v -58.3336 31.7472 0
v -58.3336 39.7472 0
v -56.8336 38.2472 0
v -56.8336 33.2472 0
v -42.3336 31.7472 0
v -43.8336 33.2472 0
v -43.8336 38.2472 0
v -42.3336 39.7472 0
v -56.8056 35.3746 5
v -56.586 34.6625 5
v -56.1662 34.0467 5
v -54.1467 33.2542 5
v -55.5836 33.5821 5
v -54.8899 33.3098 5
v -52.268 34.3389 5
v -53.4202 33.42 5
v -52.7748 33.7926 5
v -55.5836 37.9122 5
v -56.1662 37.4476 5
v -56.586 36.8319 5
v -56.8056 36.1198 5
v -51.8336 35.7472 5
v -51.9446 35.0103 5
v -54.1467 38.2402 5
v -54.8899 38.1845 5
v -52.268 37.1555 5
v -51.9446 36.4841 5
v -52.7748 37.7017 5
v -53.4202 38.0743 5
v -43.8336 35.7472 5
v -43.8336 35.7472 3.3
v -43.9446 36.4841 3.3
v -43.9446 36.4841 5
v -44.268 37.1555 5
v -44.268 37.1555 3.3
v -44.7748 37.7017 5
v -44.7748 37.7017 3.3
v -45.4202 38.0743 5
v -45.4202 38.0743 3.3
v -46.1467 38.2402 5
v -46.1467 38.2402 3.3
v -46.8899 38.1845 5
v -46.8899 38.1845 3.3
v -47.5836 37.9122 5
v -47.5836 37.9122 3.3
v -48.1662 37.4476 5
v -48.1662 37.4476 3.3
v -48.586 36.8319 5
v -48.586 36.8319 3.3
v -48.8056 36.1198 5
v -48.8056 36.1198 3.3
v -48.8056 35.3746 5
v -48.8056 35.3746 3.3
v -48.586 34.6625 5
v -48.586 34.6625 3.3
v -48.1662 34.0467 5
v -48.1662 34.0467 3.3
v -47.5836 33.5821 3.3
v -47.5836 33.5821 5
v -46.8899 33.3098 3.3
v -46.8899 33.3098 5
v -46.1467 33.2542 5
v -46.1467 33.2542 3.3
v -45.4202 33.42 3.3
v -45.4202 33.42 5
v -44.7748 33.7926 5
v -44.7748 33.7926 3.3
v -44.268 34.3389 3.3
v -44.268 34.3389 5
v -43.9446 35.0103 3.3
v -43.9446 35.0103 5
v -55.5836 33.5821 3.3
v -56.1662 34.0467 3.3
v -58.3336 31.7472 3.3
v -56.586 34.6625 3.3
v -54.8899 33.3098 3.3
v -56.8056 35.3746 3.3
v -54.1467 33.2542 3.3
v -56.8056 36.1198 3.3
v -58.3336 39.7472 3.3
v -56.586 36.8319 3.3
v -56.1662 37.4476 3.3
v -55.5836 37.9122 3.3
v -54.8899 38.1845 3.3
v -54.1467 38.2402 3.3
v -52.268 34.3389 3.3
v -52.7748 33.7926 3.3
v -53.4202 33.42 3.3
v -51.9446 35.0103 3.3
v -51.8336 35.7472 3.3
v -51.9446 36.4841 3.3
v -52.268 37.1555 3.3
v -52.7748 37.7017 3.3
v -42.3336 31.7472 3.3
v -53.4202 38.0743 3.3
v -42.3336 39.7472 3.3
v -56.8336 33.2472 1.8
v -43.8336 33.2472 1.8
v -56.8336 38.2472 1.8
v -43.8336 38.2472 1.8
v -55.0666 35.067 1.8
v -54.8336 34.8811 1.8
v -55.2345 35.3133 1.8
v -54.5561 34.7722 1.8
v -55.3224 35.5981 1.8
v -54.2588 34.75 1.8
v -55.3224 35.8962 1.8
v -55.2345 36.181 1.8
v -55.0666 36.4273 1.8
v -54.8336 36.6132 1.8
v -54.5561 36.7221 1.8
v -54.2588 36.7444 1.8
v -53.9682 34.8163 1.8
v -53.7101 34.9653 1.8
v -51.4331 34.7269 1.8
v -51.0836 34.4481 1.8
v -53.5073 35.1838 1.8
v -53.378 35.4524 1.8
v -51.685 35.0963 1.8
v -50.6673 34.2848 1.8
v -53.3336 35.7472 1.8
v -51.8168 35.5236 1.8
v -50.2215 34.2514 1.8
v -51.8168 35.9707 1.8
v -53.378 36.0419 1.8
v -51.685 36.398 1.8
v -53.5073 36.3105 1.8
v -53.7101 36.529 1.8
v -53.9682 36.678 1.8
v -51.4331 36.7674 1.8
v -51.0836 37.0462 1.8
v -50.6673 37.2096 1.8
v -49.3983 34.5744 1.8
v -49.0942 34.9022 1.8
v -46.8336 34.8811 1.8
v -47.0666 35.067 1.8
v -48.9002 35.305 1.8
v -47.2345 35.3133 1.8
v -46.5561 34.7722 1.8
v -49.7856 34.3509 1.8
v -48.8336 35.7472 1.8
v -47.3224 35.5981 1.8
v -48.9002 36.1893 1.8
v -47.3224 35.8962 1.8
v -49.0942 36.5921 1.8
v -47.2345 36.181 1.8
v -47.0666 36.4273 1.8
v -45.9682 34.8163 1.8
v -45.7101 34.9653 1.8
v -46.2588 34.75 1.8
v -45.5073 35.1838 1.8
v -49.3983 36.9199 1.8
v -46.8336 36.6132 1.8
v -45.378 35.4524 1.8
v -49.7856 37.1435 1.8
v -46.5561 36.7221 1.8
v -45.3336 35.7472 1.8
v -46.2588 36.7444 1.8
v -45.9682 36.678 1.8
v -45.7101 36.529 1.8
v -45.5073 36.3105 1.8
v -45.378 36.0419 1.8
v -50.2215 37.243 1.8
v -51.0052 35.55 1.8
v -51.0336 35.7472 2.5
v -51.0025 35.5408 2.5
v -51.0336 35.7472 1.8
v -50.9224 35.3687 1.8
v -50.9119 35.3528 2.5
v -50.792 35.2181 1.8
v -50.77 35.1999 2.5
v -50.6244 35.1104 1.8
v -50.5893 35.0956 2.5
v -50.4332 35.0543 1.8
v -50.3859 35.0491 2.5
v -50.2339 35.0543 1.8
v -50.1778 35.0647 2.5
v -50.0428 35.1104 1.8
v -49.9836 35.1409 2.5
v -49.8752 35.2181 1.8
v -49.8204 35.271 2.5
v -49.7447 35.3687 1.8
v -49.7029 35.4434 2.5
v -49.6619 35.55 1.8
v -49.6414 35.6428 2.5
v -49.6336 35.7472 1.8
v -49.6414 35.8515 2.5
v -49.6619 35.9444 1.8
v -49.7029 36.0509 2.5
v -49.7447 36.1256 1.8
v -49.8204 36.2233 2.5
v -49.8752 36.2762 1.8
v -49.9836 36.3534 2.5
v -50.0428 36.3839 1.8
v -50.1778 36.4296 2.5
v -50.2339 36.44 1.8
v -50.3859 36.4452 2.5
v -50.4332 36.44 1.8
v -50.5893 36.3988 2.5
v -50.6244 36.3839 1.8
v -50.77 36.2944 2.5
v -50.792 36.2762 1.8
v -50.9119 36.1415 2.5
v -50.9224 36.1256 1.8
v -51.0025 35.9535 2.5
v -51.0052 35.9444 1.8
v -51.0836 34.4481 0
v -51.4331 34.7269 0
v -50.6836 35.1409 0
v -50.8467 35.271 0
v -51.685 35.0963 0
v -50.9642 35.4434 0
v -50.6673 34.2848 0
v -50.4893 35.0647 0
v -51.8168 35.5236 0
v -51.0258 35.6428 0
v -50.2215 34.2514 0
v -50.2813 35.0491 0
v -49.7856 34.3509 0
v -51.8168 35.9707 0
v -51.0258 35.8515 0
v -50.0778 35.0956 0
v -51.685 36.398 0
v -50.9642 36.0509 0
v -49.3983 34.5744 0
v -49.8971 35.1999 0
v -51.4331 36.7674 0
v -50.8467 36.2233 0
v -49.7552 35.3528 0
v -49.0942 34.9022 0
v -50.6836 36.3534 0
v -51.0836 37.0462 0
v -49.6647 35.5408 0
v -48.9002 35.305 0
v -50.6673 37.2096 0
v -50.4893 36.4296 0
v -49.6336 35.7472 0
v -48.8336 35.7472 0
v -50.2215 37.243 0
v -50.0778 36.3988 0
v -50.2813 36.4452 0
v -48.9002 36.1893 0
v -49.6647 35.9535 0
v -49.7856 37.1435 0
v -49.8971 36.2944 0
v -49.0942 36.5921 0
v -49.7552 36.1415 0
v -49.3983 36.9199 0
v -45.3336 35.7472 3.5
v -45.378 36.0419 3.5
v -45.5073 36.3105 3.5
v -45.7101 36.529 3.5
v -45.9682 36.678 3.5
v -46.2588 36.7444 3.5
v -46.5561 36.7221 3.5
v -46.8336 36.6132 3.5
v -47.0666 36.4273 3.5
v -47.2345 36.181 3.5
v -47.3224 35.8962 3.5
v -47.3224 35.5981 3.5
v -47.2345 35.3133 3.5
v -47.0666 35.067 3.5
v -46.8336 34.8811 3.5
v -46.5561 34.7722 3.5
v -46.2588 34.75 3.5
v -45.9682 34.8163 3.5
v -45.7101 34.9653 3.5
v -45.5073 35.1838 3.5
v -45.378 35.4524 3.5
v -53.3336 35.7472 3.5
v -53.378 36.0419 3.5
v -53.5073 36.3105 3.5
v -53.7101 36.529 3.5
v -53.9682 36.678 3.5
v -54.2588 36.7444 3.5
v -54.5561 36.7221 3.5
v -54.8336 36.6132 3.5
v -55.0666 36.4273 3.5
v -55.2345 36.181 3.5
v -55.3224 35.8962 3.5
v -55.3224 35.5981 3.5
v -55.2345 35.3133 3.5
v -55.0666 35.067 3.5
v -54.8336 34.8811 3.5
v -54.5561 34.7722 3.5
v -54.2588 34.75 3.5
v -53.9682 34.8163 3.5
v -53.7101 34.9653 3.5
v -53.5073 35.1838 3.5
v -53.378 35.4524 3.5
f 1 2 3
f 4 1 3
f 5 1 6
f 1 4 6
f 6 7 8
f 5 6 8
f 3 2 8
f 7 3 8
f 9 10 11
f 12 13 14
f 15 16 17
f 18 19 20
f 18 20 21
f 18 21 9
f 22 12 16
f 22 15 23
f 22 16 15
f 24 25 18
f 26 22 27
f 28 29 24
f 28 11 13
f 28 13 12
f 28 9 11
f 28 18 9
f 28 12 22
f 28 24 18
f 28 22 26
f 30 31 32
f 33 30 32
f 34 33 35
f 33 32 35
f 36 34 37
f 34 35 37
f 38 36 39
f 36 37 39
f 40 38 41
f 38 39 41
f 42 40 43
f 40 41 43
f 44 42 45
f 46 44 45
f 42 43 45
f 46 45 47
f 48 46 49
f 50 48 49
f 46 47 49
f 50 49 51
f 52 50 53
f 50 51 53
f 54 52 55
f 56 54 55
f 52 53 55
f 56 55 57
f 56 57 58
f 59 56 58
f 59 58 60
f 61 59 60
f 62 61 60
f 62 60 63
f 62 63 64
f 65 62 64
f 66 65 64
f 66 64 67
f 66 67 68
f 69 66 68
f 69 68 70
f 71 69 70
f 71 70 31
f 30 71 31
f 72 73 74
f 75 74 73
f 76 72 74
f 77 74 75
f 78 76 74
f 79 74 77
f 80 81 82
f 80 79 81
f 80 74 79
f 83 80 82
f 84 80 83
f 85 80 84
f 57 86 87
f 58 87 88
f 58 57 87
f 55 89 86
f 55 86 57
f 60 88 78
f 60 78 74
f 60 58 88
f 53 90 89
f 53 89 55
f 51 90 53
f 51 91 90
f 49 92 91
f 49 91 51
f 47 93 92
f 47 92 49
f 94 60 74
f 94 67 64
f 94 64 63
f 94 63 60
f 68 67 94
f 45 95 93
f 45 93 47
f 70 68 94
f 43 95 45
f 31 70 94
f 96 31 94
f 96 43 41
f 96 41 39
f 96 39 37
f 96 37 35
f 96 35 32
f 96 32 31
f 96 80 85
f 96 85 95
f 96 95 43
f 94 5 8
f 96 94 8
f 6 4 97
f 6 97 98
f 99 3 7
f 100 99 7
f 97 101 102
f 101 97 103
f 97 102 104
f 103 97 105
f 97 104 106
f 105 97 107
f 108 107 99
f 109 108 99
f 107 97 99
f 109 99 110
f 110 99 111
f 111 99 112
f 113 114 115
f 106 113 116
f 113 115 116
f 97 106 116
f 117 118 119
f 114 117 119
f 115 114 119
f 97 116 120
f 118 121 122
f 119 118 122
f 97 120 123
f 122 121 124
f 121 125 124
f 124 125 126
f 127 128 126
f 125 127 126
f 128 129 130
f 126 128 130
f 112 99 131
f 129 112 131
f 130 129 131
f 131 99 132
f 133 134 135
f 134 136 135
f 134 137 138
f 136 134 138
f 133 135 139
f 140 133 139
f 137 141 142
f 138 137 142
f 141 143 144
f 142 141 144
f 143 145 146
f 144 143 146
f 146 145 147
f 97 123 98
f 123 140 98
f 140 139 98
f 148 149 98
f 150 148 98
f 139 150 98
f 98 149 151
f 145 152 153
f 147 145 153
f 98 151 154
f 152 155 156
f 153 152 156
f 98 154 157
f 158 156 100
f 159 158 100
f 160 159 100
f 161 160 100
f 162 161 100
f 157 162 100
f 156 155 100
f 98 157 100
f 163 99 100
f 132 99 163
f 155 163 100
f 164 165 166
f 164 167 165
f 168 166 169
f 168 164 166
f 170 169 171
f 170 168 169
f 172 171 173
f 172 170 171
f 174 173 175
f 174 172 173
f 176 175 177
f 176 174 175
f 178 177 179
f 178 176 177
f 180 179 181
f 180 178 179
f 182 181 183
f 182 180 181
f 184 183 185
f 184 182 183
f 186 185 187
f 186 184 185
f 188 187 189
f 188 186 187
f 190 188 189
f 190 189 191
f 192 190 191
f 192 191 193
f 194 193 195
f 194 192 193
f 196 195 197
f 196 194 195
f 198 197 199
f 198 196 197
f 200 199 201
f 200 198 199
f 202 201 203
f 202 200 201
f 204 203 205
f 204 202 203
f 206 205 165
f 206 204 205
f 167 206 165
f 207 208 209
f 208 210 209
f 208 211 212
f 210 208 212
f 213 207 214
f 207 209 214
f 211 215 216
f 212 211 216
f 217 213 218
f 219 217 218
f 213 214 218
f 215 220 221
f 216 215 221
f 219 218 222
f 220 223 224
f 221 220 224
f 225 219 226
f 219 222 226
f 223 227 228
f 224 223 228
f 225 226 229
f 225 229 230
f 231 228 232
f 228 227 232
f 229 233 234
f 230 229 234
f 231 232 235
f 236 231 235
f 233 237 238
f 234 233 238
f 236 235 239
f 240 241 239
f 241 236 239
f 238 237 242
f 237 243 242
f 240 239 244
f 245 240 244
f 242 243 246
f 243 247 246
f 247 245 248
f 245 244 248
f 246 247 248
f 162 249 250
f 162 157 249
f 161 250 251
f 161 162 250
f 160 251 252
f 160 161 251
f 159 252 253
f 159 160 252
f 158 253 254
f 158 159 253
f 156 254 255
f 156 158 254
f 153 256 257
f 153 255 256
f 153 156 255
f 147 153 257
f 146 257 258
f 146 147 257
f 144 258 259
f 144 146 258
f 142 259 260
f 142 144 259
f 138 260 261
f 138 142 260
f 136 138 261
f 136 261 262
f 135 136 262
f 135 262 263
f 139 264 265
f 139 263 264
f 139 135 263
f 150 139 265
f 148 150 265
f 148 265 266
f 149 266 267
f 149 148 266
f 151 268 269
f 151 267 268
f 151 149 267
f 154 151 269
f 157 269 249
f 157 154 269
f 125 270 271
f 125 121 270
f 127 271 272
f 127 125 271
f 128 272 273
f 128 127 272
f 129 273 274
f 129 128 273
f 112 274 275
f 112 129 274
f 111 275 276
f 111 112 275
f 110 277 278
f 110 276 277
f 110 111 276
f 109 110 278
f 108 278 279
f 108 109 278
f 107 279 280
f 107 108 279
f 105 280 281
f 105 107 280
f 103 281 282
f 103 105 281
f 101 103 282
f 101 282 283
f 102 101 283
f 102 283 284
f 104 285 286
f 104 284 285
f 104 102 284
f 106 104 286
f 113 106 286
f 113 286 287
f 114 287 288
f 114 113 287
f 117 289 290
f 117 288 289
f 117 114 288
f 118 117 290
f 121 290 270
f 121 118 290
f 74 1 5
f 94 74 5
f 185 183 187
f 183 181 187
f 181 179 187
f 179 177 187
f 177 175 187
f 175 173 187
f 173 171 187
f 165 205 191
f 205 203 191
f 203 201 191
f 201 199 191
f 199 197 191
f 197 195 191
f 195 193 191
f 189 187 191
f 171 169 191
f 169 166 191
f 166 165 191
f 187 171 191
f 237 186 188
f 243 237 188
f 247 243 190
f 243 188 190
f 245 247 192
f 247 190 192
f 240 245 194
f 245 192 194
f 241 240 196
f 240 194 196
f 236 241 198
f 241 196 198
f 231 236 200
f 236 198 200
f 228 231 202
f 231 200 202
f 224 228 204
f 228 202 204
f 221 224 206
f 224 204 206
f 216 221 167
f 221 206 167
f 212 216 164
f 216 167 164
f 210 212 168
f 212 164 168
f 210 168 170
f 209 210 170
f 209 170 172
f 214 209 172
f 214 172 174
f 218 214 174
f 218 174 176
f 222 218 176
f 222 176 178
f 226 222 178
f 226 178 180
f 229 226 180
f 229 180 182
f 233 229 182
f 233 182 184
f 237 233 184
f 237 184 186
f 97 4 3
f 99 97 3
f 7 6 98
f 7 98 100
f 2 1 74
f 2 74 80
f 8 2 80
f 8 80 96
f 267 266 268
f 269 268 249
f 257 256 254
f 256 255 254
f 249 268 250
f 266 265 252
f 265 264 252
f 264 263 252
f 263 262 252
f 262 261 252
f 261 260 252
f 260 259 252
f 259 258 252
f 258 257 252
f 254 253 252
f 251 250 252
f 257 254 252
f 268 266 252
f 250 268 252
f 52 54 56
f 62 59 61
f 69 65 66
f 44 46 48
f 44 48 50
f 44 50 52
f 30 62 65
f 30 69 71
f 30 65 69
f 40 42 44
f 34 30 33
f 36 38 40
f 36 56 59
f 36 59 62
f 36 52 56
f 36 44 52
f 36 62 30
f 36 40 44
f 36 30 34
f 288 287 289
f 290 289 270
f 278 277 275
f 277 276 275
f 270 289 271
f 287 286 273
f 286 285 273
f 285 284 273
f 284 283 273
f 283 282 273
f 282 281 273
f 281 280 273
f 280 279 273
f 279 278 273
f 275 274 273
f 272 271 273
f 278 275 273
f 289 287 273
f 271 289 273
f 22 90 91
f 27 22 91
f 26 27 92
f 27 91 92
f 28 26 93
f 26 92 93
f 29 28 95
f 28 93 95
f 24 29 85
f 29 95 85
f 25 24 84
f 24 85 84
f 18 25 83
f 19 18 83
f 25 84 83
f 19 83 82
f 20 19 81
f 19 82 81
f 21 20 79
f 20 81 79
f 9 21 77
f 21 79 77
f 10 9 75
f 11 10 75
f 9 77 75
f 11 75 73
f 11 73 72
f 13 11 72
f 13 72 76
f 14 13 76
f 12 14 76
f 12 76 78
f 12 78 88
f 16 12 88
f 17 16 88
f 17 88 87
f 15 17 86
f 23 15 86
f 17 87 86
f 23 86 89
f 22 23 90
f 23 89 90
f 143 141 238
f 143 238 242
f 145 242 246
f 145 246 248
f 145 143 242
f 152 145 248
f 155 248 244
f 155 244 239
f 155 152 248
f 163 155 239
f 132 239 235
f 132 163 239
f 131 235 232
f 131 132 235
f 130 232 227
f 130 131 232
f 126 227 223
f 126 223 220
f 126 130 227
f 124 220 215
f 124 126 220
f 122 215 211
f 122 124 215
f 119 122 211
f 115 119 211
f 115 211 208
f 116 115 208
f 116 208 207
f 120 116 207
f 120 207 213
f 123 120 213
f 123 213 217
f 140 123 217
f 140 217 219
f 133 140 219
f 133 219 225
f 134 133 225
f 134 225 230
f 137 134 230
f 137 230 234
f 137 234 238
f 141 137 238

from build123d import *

# Parameters (mm, degrees)
F0_W        = 16
F0_H        = 8
F1_DEPTH    = 3.3
F3_R        = 2.5
F4_DEPTH    = 1.7
F6_T        = -1.5
F7_DEPTH    = 3.3
F8_T        = 0.8
F8_T3_DEPTH = 3.4
F8_T5_DEPTH = 6.6
F8_T7_DEPTH = 14.6


# Not quite as in the source:
# - a shell that OpenCascade refuses in one call is made with other operations: the cavity is built on its own and cut out


with BuildPart() as f1:
    # F0 (on Top) → F1 (new body)
    with BuildSketch(Plane.XY):
        with Locations((-50.3335684606, 35.747165516)):
            Rectangle(F0_W, F0_H)
    extrude(amount=F1_DEPTH)

    # F3 (on face) → F4 (join)
    with BuildSketch(Plane.XY.offset(3.3)):
        with Locations((-46.3335684606, 35.747165516)):
            Circle(F3_R)
        with Locations((-54.3335684606, 35.747165516)):
            Circle(F3_R)
    extrude(amount=F4_DEPTH)

    # F6
    f6_openings = [f1.faces().sort_by_distance(p)[0] for p in [
        (-50.333568, 35.747166, 0),
    ]]
    offset(amount=F6_T, openings=f6_openings, kind=Kind.INTERSECTION)

    # F5 (on face) → F7 (join)
    with BuildSketch(Plane.XY.offset(3.3)):
        with BuildLine():
            ThreePointArc((-51.8335684606, 35.747165516), (-50.3335684606, 34.247165516), (-48.8335684606, 35.747165516))
            ThreePointArc((-48.8335684606, 35.747165516), (-50.3335684606, 37.247165516), (-51.8335684606, 35.747165516))
        make_face()
    extrude(amount=-F7_DEPTH)

    # F8: shell of thickness 0.8, made by hand


with BuildPart() as f8_core1:
    # F8_t2: copy of F1
    add(f1.part)

    # the walls: a layer under each face that stays
    f8_faces = [f8_core1.faces().sort_by_distance(p)[0] for p in [
        (-50.3335684606, 39.747165516, 1.65),
        (-50.3335684606, 35.747165516, 3.3),
        (-48.8335684606, 35.747165516, 4.15),
        (-46.3335684606, 35.747165516, 5),
        (-56.8335684606, 35.747165516, 4.15),
        (-54.3335684606, 35.747165516, 5),
        (-50.3335684606, 31.747165516, 1.65),
        (-55.666901794, 33.0804988494, 0),
        (-56.8335684606, 35.747165516, 0.9),
        (-54.666901794, 34.0804988494, 1.8),
        (-47.3335684606, 35.747165516, 2.65),
        (-46.3335684606, 35.747165516, 3.5),
        (-48.8335684606, 35.747165516, 0.9),
        (-55.3335684606, 35.747165516, 2.65),
        (-54.3335684606, 35.747165516, 3.5),
        (-50.3335684606, 33.247165516, 0.9),
        (-43.8335684606, 35.747165516, 0.9),
        (-50.3335684606, 38.247165516, 0.9),
        (-58.3335684606, 35.747165516, 1.65),
        (-42.3335684606, 35.747165516, 1.65),
    ]]
    thicken(f8_faces, amount=-F8_T, mode=Mode.SUBTRACT)

    # F8_s4 → F8_t3 (cut)
    with BuildSketch(Plane.XY.offset(-0.8)):
        Polygon((-56.8255684606, 33.255165516), (-57.6335684606, 33.247165516), (-57.6335684606, 32.447165516), (-56.8335684606, 32.447165516), align=None)
        Polygon((-56.8255684606, 38.239165516), (-57.6335684606, 38.247165516), (-57.6335684606, 39.047165516), (-56.8335684606, 39.047165516), align=None)
        Polygon((-43.8415684606, 33.255165516), (-43.8335684606, 32.447165516), (-43.0335684606, 32.447165516), (-43.0335684606, 33.247165516), align=None)
        Polygon((-43.8415684606, 38.239165516), (-43.0335684606, 38.247165516), (-43.0335684606, 39.047165516), (-43.8335684606, 39.047165516), align=None)
    extrude(amount=F8_T3_DEPTH, mode=Mode.SUBTRACT)

    # F8_s6 → F8_t5 (cut)
    with BuildSketch(Plane.XZ.offset(-39.047165516)):
        Polygon((-56.8255684606, 1.792), (-57.6335684606, 1.8), (-57.6335684606, 2.6), (-56.8335684606, 2.6), align=None)
        Polygon((-43.8415684606, 1.792), (-43.8335684606, 2.6), (-43.0335684606, 2.6), (-43.0335684606, 1.8), align=None)
    extrude(amount=F8_T5_DEPTH, mode=Mode.SUBTRACT)

    # F8_s8 → F8_t7 (cut)
    with BuildSketch(Plane.YZ.offset(-57.6335684606)):
        Polygon((33.255165516, 1.792), (33.247165516, 2.6), (32.447165516, 2.6), (32.447165516, 1.8), align=None)
        Polygon((38.239165516, 1.792), (38.247165516, 2.6), (39.047165516, 2.6), (39.047165516, 1.8), align=None)
    extrude(amount=F8_T7_DEPTH, mode=Mode.SUBTRACT)

    # F8_s9 → F8_t10 (revolve, cut)
    with BuildSketch(Plane.XZ.offset(-35.747165516)):
        Polygon((-51.8255684606, 3.308), (-51.8335684606, 2.5), (-52.6335684606, 2.5), (-52.6335684606, 3.3), align=None)
    revolve(axis=Axis((-54.3335684606, 35.747165516, 3.3), (0, 0, 1)), mode=Mode.SUBTRACT)

    # F8_s11 → F8_t12 (revolve, cut)
    with BuildSketch(Plane.XZ.offset(-35.747165516)):
        Polygon((-43.8255684606, 3.308), (-43.8335684606, 2.5), (-44.6335684606, 2.5), (-44.6335684606, 3.3), align=None)
    revolve(axis=Axis((-46.3335684606, 35.747165516, 3.3), (0, 0, -1)), mode=Mode.SUBTRACT)

    # F8_s13 → F8_t14 (revolve, cut)
    with BuildSketch(Plane.XZ.offset(-35.747165516)):
        Polygon((-51.8415684606, 1.792), (-51.8335684606, 2.6), (-51.0335684606, 2.6), (-51.0335684606, 1.8), align=None)
    revolve(axis=Axis((-50.3335684606, 35.747165516, 1.8), (0, 0, 1)), mode=Mode.SUBTRACT)

    # F8_s15 → F8_t16 (revolve, cut)
    with BuildSketch(Plane.XZ.offset(-35.747165516)):
        Polygon((-45.3415684606, 3.492), (-44.5335684606, 3.5), (-44.5335684606, 4.3), (-45.3335684606, 4.3), align=None)
    revolve(axis=Axis((-46.3335684606, 35.747165516, 3.5), (0, 0, -1)), mode=Mode.SUBTRACT)

    # F8_s17 → F8_t18 (revolve, cut)
    with BuildSketch(Plane.XZ.offset(-35.747165516)):
        Polygon((-53.3415684606, 3.492), (-52.5335684606, 3.5), (-52.5335684606, 4.3), (-53.3335684606, 4.3), align=None)
    revolve(axis=Axis((-54.3335684606, 35.747165516, 3.5), (0, 0, -1)), mode=Mode.SUBTRACT)


with BuildPart() as f1_1:
    add(f1.part)

    # what is left inside the walls is the cavity
    f8_cavity = [f8_core1.part.solids().sort_by_distance(p)[0] for p in [
        (-49.641568, 35.747166, 1.666667),
    ]]
    add(f8_cavity, mode=Mode.SUBTRACT)


solid = f1_1.part
